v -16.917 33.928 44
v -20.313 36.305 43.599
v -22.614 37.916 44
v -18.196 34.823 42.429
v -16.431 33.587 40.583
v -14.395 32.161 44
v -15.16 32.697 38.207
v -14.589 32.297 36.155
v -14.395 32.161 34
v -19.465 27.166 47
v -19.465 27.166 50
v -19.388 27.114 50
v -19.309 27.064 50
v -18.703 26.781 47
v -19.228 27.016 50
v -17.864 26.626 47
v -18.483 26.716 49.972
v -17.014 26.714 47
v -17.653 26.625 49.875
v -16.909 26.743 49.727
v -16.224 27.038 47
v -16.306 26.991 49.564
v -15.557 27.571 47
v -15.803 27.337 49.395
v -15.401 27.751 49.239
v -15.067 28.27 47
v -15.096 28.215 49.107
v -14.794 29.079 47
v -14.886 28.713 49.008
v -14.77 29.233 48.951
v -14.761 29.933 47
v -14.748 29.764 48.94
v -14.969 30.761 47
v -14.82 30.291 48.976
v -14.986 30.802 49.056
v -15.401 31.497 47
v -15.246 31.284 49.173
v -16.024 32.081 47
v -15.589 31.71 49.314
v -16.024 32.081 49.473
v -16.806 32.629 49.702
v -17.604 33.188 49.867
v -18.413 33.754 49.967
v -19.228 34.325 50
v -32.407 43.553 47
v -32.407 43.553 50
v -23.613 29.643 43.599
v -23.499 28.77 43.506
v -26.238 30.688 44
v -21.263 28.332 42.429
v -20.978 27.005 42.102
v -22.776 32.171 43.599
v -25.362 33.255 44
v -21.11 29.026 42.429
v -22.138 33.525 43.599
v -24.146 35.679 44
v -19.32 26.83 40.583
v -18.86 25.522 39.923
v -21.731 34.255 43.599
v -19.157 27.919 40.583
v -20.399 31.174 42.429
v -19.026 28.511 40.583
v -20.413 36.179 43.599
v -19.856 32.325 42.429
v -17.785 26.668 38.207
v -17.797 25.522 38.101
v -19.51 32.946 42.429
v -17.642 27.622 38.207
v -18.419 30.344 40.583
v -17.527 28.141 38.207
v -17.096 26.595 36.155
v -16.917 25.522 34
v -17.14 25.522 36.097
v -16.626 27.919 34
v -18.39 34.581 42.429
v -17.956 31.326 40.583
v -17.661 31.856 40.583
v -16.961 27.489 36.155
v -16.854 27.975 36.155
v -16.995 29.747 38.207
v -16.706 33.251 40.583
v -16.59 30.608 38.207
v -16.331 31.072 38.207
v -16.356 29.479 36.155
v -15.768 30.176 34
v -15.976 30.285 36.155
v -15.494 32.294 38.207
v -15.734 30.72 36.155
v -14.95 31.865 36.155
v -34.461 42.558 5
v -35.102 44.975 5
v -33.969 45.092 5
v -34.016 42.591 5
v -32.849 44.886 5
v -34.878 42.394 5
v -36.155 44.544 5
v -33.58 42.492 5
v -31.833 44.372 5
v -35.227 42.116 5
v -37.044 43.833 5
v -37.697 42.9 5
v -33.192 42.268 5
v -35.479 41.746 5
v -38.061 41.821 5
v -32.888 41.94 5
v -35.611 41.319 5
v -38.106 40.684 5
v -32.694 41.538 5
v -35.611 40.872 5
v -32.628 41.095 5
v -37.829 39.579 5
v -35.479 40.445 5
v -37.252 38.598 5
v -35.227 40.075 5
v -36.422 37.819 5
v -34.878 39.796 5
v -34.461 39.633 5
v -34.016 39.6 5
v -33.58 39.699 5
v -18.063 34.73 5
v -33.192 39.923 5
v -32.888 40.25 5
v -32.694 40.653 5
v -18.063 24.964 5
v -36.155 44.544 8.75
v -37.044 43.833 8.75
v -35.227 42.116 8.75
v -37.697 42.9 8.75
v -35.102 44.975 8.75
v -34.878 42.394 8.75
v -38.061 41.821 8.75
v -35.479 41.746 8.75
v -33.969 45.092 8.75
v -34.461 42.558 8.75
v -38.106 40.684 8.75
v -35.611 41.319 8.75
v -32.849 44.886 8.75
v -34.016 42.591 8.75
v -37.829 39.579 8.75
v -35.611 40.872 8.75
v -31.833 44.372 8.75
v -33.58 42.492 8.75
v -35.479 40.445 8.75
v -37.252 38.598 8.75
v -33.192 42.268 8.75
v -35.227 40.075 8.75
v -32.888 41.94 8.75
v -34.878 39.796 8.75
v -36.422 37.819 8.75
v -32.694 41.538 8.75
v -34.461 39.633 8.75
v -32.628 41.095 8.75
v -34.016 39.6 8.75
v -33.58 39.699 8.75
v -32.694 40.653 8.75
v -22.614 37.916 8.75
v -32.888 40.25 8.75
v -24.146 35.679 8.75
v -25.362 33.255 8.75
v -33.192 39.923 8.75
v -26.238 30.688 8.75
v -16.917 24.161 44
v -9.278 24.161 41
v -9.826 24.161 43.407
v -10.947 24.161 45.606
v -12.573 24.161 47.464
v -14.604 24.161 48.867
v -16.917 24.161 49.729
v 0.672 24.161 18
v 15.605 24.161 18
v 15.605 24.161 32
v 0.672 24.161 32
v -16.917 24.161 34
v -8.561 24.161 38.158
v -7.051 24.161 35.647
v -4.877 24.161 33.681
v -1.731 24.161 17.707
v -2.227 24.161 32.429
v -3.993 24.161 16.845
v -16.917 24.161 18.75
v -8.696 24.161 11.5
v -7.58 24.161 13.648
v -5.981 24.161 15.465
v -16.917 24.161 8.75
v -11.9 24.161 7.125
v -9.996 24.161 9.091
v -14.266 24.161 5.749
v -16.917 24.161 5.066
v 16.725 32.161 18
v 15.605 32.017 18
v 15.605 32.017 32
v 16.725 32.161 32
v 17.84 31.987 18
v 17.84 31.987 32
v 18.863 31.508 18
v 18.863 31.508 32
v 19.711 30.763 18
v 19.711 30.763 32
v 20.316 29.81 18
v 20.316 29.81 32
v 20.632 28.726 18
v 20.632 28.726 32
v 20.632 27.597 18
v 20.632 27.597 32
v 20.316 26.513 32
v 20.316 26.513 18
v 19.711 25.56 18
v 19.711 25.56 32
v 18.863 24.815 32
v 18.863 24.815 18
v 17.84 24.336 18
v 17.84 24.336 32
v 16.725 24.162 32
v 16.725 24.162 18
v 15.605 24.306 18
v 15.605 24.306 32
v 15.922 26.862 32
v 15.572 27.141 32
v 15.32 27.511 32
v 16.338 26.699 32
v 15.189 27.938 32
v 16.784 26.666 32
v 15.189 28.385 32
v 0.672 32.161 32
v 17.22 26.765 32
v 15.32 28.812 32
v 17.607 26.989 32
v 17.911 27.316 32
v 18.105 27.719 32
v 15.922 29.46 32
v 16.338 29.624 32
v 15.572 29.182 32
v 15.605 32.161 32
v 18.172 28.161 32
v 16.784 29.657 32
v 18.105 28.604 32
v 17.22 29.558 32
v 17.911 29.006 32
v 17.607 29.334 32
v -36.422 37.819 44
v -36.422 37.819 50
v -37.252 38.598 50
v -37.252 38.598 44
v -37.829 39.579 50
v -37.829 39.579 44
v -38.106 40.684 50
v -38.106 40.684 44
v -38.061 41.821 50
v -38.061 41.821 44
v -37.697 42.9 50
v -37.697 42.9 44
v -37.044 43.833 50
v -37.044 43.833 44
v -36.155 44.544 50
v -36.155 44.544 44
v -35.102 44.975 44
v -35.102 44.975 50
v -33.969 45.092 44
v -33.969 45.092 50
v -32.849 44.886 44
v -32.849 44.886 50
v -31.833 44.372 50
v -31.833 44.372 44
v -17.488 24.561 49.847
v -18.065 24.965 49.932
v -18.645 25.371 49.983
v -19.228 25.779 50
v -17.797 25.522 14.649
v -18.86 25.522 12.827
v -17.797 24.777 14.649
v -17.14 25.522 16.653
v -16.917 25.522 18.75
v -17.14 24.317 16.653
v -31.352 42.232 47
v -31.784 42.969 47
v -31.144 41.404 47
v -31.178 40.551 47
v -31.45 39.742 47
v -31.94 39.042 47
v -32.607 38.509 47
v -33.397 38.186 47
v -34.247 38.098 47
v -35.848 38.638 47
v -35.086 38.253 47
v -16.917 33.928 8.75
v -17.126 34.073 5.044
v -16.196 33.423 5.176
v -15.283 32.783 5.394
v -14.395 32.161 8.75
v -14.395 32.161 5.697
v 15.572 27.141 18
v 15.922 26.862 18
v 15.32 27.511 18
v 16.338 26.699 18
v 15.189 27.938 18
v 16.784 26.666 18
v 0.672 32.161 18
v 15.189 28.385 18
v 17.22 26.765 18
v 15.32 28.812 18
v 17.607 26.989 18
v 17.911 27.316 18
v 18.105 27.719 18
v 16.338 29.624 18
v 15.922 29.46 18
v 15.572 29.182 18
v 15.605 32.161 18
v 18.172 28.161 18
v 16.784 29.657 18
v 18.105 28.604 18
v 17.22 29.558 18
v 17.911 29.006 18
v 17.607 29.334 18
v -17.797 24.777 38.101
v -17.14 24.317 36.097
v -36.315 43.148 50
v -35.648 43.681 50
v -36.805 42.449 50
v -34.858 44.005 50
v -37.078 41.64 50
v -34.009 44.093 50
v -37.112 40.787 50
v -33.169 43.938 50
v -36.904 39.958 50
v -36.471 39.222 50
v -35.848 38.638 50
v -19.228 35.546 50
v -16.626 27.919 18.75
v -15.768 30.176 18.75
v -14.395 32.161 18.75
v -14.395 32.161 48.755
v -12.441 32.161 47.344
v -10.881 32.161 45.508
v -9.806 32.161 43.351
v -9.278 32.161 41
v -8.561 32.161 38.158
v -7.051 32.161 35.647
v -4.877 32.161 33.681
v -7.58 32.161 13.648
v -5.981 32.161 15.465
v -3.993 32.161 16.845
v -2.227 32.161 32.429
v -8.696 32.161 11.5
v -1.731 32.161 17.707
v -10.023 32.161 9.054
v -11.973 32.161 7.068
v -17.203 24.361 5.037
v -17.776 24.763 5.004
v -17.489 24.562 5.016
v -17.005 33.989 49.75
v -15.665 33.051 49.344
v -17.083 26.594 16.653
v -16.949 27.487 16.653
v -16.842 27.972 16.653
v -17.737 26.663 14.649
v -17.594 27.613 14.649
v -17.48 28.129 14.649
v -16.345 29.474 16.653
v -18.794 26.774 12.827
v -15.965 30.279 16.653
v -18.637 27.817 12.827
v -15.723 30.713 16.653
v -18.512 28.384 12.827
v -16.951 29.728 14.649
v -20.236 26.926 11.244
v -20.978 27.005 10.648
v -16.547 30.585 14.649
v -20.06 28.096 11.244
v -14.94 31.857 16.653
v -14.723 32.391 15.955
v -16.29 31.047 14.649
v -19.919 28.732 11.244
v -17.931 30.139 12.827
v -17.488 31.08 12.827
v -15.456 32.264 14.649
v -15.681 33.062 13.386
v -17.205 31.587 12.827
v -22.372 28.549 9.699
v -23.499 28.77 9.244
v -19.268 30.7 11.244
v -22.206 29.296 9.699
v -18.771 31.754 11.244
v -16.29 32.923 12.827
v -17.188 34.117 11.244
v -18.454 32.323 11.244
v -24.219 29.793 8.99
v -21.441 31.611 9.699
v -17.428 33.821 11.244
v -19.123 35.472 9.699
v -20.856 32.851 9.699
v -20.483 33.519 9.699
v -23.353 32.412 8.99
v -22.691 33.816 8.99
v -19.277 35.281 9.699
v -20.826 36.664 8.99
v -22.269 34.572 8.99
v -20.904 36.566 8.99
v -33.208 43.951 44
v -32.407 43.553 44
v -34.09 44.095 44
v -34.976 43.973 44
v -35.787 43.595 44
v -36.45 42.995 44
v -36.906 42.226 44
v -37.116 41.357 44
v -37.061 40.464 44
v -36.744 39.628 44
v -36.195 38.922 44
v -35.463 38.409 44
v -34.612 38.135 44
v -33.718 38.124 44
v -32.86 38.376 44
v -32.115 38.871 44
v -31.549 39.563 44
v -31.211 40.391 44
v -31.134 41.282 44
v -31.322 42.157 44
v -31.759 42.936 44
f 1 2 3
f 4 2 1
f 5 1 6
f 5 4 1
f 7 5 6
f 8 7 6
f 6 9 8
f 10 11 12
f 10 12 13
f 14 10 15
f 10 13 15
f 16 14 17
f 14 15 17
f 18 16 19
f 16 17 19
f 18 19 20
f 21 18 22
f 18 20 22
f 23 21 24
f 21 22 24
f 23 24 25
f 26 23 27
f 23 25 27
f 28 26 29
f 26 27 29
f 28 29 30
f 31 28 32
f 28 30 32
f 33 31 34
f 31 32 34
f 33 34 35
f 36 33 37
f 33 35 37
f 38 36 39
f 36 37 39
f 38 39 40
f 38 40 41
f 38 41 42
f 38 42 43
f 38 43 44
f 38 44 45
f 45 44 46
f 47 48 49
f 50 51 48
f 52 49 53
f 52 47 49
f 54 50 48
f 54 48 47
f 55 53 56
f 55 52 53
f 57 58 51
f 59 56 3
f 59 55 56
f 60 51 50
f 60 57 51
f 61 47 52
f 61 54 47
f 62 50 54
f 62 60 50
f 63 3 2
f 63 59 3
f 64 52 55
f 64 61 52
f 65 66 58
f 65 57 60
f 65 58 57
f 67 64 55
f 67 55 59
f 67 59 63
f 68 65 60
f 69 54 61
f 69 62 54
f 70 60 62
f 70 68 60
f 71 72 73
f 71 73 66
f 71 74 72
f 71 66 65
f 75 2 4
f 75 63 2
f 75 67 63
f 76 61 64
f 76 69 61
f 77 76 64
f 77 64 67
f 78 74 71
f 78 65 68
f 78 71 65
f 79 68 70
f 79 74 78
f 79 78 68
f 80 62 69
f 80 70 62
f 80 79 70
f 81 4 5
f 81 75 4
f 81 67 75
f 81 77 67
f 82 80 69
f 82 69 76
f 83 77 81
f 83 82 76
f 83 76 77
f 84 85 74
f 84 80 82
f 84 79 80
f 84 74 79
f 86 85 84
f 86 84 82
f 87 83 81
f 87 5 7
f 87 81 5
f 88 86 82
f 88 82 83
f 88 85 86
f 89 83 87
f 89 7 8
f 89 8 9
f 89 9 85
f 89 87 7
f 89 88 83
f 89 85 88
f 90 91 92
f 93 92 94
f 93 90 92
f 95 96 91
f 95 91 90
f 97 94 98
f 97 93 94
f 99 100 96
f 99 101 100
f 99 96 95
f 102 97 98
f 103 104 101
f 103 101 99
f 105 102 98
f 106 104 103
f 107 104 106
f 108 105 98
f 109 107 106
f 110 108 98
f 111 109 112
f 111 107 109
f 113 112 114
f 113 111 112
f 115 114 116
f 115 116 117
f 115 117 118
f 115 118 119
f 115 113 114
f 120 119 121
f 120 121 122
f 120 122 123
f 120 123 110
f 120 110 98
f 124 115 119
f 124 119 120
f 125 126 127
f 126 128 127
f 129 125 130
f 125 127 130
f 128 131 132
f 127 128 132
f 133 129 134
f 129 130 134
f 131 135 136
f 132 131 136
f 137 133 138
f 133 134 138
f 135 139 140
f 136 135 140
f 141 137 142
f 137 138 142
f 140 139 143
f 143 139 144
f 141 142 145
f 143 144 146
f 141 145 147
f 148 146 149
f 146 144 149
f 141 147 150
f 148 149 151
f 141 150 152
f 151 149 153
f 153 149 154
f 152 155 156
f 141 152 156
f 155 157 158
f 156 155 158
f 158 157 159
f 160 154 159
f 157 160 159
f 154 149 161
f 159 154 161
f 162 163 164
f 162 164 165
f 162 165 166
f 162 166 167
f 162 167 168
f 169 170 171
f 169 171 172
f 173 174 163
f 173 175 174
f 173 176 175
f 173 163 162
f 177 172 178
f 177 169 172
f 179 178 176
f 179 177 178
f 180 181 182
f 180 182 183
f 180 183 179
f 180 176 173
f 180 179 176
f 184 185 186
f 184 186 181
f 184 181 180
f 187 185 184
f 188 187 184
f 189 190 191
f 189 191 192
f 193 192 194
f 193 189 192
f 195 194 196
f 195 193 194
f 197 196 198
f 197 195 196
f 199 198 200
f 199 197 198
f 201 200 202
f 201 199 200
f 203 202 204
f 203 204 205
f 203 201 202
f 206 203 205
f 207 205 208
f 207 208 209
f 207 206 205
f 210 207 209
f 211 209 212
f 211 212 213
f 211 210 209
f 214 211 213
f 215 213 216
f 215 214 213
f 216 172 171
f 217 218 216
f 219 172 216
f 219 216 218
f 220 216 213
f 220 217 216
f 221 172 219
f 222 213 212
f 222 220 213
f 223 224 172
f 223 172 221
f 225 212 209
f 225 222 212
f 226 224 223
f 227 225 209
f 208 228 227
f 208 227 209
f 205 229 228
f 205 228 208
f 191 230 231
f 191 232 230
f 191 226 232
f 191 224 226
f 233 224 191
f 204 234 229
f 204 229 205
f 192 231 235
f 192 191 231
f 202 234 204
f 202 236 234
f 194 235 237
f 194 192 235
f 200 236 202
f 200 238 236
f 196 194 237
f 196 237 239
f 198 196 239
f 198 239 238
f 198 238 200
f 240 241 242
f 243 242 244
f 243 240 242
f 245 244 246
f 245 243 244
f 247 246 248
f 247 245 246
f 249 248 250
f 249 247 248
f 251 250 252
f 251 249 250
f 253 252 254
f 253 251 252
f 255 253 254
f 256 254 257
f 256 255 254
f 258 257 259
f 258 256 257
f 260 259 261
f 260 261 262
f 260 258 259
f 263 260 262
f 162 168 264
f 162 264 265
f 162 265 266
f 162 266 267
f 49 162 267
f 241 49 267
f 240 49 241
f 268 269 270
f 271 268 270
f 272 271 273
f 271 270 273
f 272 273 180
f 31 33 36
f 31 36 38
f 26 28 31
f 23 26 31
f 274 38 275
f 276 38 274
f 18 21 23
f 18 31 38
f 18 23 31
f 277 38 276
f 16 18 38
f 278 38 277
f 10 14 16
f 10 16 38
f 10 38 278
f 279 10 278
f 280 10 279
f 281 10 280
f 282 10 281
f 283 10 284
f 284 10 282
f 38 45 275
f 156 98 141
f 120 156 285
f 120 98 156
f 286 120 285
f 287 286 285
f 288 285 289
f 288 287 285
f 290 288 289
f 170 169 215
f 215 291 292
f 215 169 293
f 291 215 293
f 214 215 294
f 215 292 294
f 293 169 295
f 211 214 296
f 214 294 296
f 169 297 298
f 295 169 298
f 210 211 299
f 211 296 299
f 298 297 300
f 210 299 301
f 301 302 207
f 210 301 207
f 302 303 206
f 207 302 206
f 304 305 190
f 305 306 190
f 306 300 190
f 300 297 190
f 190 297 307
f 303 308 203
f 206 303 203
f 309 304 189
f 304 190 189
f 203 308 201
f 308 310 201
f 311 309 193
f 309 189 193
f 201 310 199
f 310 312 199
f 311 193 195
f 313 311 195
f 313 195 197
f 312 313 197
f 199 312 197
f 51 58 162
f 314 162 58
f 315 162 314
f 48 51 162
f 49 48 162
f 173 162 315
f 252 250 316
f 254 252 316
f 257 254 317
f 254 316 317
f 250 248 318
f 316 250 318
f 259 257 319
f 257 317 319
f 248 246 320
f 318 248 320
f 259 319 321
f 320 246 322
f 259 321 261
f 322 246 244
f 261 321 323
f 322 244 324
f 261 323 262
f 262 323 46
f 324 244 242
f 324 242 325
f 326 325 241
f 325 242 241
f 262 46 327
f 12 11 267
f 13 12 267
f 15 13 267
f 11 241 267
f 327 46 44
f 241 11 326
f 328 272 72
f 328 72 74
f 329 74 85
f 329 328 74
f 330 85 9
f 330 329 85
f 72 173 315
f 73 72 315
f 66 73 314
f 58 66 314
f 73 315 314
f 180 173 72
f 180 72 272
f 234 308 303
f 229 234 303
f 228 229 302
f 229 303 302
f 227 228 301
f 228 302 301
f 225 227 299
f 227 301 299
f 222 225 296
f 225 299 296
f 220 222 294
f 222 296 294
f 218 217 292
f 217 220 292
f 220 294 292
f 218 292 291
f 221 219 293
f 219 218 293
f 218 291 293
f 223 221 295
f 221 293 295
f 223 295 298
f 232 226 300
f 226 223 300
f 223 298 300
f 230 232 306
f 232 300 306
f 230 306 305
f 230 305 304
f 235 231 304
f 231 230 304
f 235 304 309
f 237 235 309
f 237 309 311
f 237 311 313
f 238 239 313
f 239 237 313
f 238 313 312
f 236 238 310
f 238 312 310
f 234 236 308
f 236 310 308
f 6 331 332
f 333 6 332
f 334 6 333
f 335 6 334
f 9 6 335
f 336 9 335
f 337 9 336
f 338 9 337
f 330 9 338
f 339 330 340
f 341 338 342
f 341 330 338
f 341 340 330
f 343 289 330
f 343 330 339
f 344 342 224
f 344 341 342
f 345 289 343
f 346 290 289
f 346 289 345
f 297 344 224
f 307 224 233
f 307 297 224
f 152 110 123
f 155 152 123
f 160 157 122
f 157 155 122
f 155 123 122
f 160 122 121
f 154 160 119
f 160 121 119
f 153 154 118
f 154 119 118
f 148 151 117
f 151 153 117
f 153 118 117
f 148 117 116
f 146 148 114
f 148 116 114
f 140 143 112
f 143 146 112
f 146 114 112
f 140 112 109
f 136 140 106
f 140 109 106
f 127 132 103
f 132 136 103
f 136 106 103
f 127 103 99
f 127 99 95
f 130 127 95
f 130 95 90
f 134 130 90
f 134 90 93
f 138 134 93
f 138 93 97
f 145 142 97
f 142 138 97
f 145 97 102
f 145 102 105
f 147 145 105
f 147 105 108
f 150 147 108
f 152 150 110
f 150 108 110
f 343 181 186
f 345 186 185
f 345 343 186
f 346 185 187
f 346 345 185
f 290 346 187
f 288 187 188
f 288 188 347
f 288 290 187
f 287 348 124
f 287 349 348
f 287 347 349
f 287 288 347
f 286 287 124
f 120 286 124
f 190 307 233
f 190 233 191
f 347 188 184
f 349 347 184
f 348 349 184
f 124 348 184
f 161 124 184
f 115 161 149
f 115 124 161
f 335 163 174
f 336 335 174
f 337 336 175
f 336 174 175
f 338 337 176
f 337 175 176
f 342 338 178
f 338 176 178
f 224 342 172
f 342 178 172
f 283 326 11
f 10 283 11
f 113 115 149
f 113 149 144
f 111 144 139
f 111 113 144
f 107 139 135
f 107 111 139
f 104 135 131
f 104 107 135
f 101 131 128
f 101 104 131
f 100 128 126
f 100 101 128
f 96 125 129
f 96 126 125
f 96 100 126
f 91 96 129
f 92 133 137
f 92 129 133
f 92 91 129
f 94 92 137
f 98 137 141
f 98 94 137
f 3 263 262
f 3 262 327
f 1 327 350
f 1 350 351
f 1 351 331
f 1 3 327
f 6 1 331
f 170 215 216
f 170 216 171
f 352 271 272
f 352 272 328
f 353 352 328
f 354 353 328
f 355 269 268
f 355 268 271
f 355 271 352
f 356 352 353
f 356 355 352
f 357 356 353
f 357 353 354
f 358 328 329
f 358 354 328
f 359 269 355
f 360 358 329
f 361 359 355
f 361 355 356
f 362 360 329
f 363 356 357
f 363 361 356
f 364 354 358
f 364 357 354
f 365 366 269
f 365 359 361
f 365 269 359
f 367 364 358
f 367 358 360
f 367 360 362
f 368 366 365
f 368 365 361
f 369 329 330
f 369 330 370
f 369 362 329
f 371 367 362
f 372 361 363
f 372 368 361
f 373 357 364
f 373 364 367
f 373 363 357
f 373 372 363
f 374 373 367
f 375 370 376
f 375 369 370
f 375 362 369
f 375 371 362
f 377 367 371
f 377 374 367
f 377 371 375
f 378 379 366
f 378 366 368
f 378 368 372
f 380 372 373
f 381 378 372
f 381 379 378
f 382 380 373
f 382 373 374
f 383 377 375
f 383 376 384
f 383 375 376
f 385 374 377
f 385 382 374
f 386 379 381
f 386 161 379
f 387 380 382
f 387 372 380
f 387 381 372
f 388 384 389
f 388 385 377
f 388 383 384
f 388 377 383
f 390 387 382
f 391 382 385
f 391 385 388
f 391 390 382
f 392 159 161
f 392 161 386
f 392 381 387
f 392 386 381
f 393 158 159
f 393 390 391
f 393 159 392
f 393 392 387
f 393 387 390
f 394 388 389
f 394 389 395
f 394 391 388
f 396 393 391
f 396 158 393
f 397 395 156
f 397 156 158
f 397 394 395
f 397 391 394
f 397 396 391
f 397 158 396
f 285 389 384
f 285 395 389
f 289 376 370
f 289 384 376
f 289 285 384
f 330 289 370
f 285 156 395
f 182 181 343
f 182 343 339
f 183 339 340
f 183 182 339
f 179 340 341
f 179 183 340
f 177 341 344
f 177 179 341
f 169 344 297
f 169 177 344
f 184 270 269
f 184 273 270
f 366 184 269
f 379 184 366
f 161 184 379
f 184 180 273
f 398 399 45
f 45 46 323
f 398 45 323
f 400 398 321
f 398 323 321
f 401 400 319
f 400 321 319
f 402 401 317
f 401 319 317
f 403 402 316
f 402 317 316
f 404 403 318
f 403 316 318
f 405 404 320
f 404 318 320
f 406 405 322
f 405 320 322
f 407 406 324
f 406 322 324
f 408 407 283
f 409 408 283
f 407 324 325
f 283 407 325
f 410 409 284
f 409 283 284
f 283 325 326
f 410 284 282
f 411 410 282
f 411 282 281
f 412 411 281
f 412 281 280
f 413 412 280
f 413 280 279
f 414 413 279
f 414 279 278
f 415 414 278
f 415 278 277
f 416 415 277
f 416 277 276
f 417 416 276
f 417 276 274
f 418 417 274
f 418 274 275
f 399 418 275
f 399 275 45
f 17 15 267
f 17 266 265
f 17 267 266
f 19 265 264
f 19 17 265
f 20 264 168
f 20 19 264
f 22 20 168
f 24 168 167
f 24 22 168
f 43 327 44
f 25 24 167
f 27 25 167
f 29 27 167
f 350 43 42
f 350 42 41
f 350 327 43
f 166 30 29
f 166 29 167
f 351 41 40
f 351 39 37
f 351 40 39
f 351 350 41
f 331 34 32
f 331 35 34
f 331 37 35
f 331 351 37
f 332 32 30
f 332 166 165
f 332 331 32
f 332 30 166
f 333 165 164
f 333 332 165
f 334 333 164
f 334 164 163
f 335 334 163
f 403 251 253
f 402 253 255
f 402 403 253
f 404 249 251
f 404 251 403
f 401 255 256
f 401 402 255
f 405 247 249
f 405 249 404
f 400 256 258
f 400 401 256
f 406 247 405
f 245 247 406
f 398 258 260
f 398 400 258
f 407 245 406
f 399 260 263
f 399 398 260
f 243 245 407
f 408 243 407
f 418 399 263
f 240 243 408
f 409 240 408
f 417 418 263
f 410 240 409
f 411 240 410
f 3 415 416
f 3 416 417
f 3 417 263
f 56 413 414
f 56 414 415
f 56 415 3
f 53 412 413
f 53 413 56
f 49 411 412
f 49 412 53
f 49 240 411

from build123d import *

# Parameters (mm, degrees)
SKETCH_1_R           = 1.5
EXTRUDE_2_DEPTH      = 50
SKETCH_14_W          = 30
SKETCH_14_H          = 18
CUT_EXTRUDE_6_DEPTH  = 65.195102675
SKETCH_15_W          = 22.4475894
SKETCH_15_H          = 16.25
CUT_EXTRUDE_7_DEPTH  = 30
SKETCH_17_W          = 25.359818697
SKETCH_17_H          = 19
CUT_EXTRUDE_9_DEPTH  = 30
FILLET_8_R           = 10
SKETCH_19_W          = 34.027540403
SKETCH_19_H          = 5
CUT_EXTRUDE_11_DEPTH = 65.759348106
FILLET_9_R           = 10
FILLET_11_R          = 10
FILLET_12_R          = 10
CUT_EXTRUDE_12_DEPTH = 3
CUT_EXTRUDE_START    = -5
SKETCH_21_R          = 3
CUT_EXTRUDE_13_DEPTH = 5


with BuildPart() as part:
    # 草图1 → 凸台-拉伸2 (new body)
    with BuildSketch(Plane.XY):
        with BuildLine():
            Line((15.60515688, 4.016530447), (15.60515688, 4.161375168))
            Line((15.60515688, 4.161375168), (-16.917233431, 4.161375168))
            Line((-16.917233431, 4.161375168), (-36.422020871, -9.496024029))
            ThreePointArc((-36.422020871, -9.496024029), (-37.404323302, -15.066937951), (-31.83340938, -16.049240383))
            Line((-31.83340938, -16.049240383), (-14.39484312, -3.838624832))
            Line((-14.39484312, -3.838624832), (15.60515688, -3.838624832))
            Line((15.60515688, -3.838624832), (15.60515688, -3.693780111))
            ThreePointArc((15.60515688, -3.693780111), (20.671823547, 0.161375168), (15.60515688, 4.016530447))
        make_face()
        with Locations((-34.127715125, -12.772632206)):
            Circle(SKETCH_1_R, mode=Mode.SUBTRACT)
        with Locations((16.671823547, 0.161375168)):
            Circle(SKETCH_1_R, mode=Mode.SUBTRACT)
    extrude(amount=EXTRUDE_2_DEPTH)

    # 草图14 → 切除-拉伸6 (cut, through all)
    with BuildSketch(Plane.XZ.offset(3.838624832)):
        with Locations((5.671823547, 41)):
            Rectangle(SKETCH_14_W, SKETCH_14_H)
        with Locations((5.671823547, 9)):
            Rectangle(SKETCH_14_W, SKETCH_14_H)
    extrude(amount=-CUT_EXTRUDE_6_DEPTH, mode=Mode.SUBTRACT)

    # 草图15 → 切除-拉伸7 (cut)
    with BuildSketch(Plane(origin=(0, 4.161375168, 0), x_dir=(1, 0, 0), z_dir=(0, 1, 0))):
        with Locations((-28.141028131, -16.875)):
            Rectangle(SKETCH_15_W, SKETCH_15_H)
    extrude(amount=-CUT_EXTRUDE_7_DEPTH, mode=Mode.SUBTRACT)

    # 草图17 → 切除-拉伸9 (cut)
    with BuildSketch(Plane(origin=(0, 4.161375168, 0), x_dir=(1, 0, 0), z_dir=(0, 1, 0))):
        with Locations((-29.59714278, -34.5)):
            Rectangle(SKETCH_17_W, SKETCH_17_H)
    extrude(amount=-CUT_EXTRUDE_9_DEPTH, mode=Mode.SUBTRACT)

    # 圆角8
    # the kernel refuses this fillet: 10 mm, written as the material it takes off along each edge
    with BuildSketch(Plane(origin=(-16.917233431, -5.604821542, 8.75), x_dir=(0.8191520442889905, 0.573576436351048, 0), z_dir=(0, 0, 1))) as fillet_8_piece_1:
        with BuildLine():
            CenterArc((13.012933373, 1.149926903), FILLET_8_R, 145, 41.603203435)
            Line((4.82141293, 6.885691266), (0, 0))
            Line((0, 0), (3.079269995, 0))
        make_face()
    extrude(amount=35.25, mode=Mode.SUBTRACT)

    # 草图19 → 切除-拉伸11 (cut, through all)
    with BuildSketch(Plane(origin=(-7.520806183, 10.740824359, 0), x_dir=(0.8191520442889908, 0.5735764363510477, 0), z_dir=(-0.5735764363510477, 0.8191520442889908, 0))):
        with Locations((-22.268098274, -2.5)):
            Rectangle(SKETCH_19_W, SKETCH_19_H)
    extrude(amount=-CUT_EXTRUDE_11_DEPTH, mode=Mode.SUBTRACT)

    # 圆角9
    fillet_9_edges = [part.edges().sort_by_distance(p)[0] for p in [
        (-9.328176453, 0.161375168, 18),
        (-9.328176453, 0.161375168, 32),
    ]]
    fillet(fillet_9_edges, radius=FILLET_9_R)

    # 圆角11
    # the kernel refuses this fillet: 10 mm, written as the material it adds along each edge
    with BuildSketch(Plane(origin=(-16.917233431, 29.161375168, 44), x_dir=(0, 0, -1), z_dir=(0, -1, 0))) as fillet_11_piece_1_section:
        with BuildLine():
            CenterArc((FILLET_11_R, -FILLET_11_R), FILLET_11_R, 90, 90)
            Line((0, -FILLET_11_R), (0, 0))
            Line((0, 0), (FILLET_11_R, 0))
        make_face()
    fillet_11_piece_1 = extrude(amount=26.360319786, mode=Mode.PRIVATE)
    fillet_11_piece_1 = split(fillet_11_piece_1, bisect_by=Plane(origin=(-17.705446038, 3.609462759, 40.498761656), z_dir=(0.5735764363510475, -0.8191520442889908, 0)), keep=Keep.TOP, mode=Mode.PRIVATE)
    add(fillet_11_piece_1)
    with BuildSketch(Plane(origin=(-16.917233431, 29.161375168, 8.75), x_dir=(-1, 0, 0), z_dir=(0, -1, 0))) as fillet_11_piece_2_section:
        with BuildLine():
            CenterArc((FILLET_11_R, -FILLET_11_R), FILLET_11_R, 90, 90)
            Line((0, -FILLET_11_R), (0, 0))
            Line((0, 0), (FILLET_11_R, 0))
        make_face()
    fillet_11_piece_2 = extrude(amount=26.360319786, mode=Mode.PRIVATE)
    fillet_11_piece_2 = split(fillet_11_piece_2, bisect_by=Plane(origin=(-17.705446038, 3.609462759, 12.251238344), z_dir=(0.5735764363510475, -0.8191520442889908, 0)), keep=Keep.TOP, mode=Mode.PRIVATE)
    add(fillet_11_piece_2)
    with BuildSketch(Plane(origin=(-6.917233431, 2.801055382, 8.75), x_dir=(-1, 0, 0), z_dir=(0, 1, 0))) as fillet_11_piece_3_section:
        with BuildLine():
            CenterArc((10 + FILLET_11_R, FILLET_11_R), FILLET_11_R, 180, 90)
            Line((10 + FILLET_11_R, 0), (10, 0))
            Line((10, 0), (10, FILLET_11_R))
        make_face()
    fillet_11_piece_3 = revolve(axis=Axis((-6.917233431, 2.801055382, 8.75), (0, 0, 1)), revolution_arc=184.854944875, mode=Mode.PRIVATE)
    fillet_11_piece_3 = split(fillet_11_piece_3, bisect_by=Plane(origin=(-14.201650521, -3.703349918, 18.374598869), z_dir=(-0.5735764363510472, 0.819152044288991, 0)), keep=Keep.TOP, mode=Mode.PRIVATE)
    fillet_11_piece_3 = split(fillet_11_piece_3, bisect_by=Plane(origin=(-18.790262012, 2.849866436, 18.374598869), z_dir=(0.5735764363510475, -0.8191520442889908, 0)), keep=Keep.TOP, mode=Mode.PRIVATE)
    add(fillet_11_piece_3)
    with BuildSketch(Plane(origin=(-6.917233431, 2.801055382, 44), x_dir=(-1, 0, 0), z_dir=(0, 1, 0))) as fillet_11_piece_4_section:
        with BuildLine():
            CenterArc((10 + FILLET_11_R, -FILLET_11_R), FILLET_11_R, 90, 90)
            Line((10 + FILLET_11_R, 0), (10, 0))
            Line((10, 0), (10, -FILLET_11_R))
        make_face()
    fillet_11_piece_4 = revolve(axis=Axis((-6.917233431, 2.801055382, 44), (0, 0, 1)), revolution_arc=184.854944875, mode=Mode.PRIVATE)
    fillet_11_piece_4 = split(fillet_11_piece_4, bisect_by=Plane(origin=(-14.743190126, -4.082540032, 40.444195091), z_dir=(-0.5735764363510472, 0.819152044288991, 0)), keep=Keep.TOP, mode=Mode.PRIVATE)
    fillet_11_piece_4 = split(fillet_11_piece_4, bisect_by=Plane(origin=(-19.331801617, 2.470676322, 40.444195091), z_dir=(0.5735764363510475, -0.8191520442889908, 0)), keep=Keep.TOP, mode=Mode.PRIVATE)
    add(fillet_11_piece_4)

    # 圆角12
    # the kernel refuses this fillet: 10 mm, written as the material it takes off along each edge
    with BuildSketch(Plane(origin=(-9.328176453, -28.587996687, 50), x_dir=(-1, 0, 0), z_dir=(0, 1, 0))) as fillet_12_piece_1:
        with BuildLine():
            CenterArc((9.899748742, -10), FILLET_12_R, 90, 84.260829523)
            Line((-0.050125629, -9), (-1.045113066, -8.9))
            ThreePointArc((-1.045113066, -8.9), (-1, -8), (-1, 0))
            Line((-1, 0), (0, 1))
            Line((0, 1), (9.899748742, 1))
            Line((9.899748742, 1), (9.899748742, 0))
        make_face()
    extrude(amount=57.498743711, mode=Mode.SUBTRACT)
    with BuildSketch(Plane(origin=(-9.328176453, -25.67610982, 5), x_dir=(-1, 0, 0), z_dir=(0, 1, 0))) as fillet_12_piece_2:
        with BuildLine():
            CenterArc((8.734993995, 10), FILLET_12_R, 200.487315115, 69.512684885)
            Line((-0.632503002, 6.5), (-1.569252702, 6.15))
            ThreePointArc((-1.569252702, 6.15), (-1, 3), (-1, 0))
            Line((-1, 0), (0, -1))
            Line((0, -1), (8.734993995, -1))
            Line((8.734993995, -1), (8.734993995, 0))
        make_face()
    extrude(amount=51.674969976, mode=Mode.SUBTRACT)

    # 草图20 → 切除-拉伸12 (cut)
    with BuildSketch(Plane.XY.offset(50)):
        with BuildLine():
            Line((-35.848444434, -10.315176073), (-19.465403549, 1.156352654))
            ThreePointArc((-19.465403549, 1.156352654), (-15.287218107, 0.41962583), (-16.02394493, -3.758559612))
            Line((-16.02394493, -3.758559612), (-32.406985816, -15.230088339))
            ThreePointArc((-32.406985816, -15.230088339), (-36.585171258, -14.493361515), (-35.848444434, -10.315176073))
        make_face()
    extrude(amount=-CUT_EXTRUDE_12_DEPTH, mode=Mode.SUBTRACT)

    # 草图21 → 切除-拉伸13 (cut)
    with BuildSketch(Plane(origin=(0, 0, 44), x_dir=(-1, 0, 0), z_dir=(0, 0, -1)).offset(CUT_EXTRUDE_START)):
        with Locations(Location((34.127715125, -12.772632206, 0), (0, 0, 235))):
            Circle(SKETCH_21_R)
    extrude(amount=CUT_EXTRUDE_13_DEPTH, mode=Mode.SUBTRACT)


with BuildPart() as body_2:
    # 镜向1: mirrored copy
    add(part.part.mirror(Plane.ZX.offset(14.161375168)))


solid = body_2.part
